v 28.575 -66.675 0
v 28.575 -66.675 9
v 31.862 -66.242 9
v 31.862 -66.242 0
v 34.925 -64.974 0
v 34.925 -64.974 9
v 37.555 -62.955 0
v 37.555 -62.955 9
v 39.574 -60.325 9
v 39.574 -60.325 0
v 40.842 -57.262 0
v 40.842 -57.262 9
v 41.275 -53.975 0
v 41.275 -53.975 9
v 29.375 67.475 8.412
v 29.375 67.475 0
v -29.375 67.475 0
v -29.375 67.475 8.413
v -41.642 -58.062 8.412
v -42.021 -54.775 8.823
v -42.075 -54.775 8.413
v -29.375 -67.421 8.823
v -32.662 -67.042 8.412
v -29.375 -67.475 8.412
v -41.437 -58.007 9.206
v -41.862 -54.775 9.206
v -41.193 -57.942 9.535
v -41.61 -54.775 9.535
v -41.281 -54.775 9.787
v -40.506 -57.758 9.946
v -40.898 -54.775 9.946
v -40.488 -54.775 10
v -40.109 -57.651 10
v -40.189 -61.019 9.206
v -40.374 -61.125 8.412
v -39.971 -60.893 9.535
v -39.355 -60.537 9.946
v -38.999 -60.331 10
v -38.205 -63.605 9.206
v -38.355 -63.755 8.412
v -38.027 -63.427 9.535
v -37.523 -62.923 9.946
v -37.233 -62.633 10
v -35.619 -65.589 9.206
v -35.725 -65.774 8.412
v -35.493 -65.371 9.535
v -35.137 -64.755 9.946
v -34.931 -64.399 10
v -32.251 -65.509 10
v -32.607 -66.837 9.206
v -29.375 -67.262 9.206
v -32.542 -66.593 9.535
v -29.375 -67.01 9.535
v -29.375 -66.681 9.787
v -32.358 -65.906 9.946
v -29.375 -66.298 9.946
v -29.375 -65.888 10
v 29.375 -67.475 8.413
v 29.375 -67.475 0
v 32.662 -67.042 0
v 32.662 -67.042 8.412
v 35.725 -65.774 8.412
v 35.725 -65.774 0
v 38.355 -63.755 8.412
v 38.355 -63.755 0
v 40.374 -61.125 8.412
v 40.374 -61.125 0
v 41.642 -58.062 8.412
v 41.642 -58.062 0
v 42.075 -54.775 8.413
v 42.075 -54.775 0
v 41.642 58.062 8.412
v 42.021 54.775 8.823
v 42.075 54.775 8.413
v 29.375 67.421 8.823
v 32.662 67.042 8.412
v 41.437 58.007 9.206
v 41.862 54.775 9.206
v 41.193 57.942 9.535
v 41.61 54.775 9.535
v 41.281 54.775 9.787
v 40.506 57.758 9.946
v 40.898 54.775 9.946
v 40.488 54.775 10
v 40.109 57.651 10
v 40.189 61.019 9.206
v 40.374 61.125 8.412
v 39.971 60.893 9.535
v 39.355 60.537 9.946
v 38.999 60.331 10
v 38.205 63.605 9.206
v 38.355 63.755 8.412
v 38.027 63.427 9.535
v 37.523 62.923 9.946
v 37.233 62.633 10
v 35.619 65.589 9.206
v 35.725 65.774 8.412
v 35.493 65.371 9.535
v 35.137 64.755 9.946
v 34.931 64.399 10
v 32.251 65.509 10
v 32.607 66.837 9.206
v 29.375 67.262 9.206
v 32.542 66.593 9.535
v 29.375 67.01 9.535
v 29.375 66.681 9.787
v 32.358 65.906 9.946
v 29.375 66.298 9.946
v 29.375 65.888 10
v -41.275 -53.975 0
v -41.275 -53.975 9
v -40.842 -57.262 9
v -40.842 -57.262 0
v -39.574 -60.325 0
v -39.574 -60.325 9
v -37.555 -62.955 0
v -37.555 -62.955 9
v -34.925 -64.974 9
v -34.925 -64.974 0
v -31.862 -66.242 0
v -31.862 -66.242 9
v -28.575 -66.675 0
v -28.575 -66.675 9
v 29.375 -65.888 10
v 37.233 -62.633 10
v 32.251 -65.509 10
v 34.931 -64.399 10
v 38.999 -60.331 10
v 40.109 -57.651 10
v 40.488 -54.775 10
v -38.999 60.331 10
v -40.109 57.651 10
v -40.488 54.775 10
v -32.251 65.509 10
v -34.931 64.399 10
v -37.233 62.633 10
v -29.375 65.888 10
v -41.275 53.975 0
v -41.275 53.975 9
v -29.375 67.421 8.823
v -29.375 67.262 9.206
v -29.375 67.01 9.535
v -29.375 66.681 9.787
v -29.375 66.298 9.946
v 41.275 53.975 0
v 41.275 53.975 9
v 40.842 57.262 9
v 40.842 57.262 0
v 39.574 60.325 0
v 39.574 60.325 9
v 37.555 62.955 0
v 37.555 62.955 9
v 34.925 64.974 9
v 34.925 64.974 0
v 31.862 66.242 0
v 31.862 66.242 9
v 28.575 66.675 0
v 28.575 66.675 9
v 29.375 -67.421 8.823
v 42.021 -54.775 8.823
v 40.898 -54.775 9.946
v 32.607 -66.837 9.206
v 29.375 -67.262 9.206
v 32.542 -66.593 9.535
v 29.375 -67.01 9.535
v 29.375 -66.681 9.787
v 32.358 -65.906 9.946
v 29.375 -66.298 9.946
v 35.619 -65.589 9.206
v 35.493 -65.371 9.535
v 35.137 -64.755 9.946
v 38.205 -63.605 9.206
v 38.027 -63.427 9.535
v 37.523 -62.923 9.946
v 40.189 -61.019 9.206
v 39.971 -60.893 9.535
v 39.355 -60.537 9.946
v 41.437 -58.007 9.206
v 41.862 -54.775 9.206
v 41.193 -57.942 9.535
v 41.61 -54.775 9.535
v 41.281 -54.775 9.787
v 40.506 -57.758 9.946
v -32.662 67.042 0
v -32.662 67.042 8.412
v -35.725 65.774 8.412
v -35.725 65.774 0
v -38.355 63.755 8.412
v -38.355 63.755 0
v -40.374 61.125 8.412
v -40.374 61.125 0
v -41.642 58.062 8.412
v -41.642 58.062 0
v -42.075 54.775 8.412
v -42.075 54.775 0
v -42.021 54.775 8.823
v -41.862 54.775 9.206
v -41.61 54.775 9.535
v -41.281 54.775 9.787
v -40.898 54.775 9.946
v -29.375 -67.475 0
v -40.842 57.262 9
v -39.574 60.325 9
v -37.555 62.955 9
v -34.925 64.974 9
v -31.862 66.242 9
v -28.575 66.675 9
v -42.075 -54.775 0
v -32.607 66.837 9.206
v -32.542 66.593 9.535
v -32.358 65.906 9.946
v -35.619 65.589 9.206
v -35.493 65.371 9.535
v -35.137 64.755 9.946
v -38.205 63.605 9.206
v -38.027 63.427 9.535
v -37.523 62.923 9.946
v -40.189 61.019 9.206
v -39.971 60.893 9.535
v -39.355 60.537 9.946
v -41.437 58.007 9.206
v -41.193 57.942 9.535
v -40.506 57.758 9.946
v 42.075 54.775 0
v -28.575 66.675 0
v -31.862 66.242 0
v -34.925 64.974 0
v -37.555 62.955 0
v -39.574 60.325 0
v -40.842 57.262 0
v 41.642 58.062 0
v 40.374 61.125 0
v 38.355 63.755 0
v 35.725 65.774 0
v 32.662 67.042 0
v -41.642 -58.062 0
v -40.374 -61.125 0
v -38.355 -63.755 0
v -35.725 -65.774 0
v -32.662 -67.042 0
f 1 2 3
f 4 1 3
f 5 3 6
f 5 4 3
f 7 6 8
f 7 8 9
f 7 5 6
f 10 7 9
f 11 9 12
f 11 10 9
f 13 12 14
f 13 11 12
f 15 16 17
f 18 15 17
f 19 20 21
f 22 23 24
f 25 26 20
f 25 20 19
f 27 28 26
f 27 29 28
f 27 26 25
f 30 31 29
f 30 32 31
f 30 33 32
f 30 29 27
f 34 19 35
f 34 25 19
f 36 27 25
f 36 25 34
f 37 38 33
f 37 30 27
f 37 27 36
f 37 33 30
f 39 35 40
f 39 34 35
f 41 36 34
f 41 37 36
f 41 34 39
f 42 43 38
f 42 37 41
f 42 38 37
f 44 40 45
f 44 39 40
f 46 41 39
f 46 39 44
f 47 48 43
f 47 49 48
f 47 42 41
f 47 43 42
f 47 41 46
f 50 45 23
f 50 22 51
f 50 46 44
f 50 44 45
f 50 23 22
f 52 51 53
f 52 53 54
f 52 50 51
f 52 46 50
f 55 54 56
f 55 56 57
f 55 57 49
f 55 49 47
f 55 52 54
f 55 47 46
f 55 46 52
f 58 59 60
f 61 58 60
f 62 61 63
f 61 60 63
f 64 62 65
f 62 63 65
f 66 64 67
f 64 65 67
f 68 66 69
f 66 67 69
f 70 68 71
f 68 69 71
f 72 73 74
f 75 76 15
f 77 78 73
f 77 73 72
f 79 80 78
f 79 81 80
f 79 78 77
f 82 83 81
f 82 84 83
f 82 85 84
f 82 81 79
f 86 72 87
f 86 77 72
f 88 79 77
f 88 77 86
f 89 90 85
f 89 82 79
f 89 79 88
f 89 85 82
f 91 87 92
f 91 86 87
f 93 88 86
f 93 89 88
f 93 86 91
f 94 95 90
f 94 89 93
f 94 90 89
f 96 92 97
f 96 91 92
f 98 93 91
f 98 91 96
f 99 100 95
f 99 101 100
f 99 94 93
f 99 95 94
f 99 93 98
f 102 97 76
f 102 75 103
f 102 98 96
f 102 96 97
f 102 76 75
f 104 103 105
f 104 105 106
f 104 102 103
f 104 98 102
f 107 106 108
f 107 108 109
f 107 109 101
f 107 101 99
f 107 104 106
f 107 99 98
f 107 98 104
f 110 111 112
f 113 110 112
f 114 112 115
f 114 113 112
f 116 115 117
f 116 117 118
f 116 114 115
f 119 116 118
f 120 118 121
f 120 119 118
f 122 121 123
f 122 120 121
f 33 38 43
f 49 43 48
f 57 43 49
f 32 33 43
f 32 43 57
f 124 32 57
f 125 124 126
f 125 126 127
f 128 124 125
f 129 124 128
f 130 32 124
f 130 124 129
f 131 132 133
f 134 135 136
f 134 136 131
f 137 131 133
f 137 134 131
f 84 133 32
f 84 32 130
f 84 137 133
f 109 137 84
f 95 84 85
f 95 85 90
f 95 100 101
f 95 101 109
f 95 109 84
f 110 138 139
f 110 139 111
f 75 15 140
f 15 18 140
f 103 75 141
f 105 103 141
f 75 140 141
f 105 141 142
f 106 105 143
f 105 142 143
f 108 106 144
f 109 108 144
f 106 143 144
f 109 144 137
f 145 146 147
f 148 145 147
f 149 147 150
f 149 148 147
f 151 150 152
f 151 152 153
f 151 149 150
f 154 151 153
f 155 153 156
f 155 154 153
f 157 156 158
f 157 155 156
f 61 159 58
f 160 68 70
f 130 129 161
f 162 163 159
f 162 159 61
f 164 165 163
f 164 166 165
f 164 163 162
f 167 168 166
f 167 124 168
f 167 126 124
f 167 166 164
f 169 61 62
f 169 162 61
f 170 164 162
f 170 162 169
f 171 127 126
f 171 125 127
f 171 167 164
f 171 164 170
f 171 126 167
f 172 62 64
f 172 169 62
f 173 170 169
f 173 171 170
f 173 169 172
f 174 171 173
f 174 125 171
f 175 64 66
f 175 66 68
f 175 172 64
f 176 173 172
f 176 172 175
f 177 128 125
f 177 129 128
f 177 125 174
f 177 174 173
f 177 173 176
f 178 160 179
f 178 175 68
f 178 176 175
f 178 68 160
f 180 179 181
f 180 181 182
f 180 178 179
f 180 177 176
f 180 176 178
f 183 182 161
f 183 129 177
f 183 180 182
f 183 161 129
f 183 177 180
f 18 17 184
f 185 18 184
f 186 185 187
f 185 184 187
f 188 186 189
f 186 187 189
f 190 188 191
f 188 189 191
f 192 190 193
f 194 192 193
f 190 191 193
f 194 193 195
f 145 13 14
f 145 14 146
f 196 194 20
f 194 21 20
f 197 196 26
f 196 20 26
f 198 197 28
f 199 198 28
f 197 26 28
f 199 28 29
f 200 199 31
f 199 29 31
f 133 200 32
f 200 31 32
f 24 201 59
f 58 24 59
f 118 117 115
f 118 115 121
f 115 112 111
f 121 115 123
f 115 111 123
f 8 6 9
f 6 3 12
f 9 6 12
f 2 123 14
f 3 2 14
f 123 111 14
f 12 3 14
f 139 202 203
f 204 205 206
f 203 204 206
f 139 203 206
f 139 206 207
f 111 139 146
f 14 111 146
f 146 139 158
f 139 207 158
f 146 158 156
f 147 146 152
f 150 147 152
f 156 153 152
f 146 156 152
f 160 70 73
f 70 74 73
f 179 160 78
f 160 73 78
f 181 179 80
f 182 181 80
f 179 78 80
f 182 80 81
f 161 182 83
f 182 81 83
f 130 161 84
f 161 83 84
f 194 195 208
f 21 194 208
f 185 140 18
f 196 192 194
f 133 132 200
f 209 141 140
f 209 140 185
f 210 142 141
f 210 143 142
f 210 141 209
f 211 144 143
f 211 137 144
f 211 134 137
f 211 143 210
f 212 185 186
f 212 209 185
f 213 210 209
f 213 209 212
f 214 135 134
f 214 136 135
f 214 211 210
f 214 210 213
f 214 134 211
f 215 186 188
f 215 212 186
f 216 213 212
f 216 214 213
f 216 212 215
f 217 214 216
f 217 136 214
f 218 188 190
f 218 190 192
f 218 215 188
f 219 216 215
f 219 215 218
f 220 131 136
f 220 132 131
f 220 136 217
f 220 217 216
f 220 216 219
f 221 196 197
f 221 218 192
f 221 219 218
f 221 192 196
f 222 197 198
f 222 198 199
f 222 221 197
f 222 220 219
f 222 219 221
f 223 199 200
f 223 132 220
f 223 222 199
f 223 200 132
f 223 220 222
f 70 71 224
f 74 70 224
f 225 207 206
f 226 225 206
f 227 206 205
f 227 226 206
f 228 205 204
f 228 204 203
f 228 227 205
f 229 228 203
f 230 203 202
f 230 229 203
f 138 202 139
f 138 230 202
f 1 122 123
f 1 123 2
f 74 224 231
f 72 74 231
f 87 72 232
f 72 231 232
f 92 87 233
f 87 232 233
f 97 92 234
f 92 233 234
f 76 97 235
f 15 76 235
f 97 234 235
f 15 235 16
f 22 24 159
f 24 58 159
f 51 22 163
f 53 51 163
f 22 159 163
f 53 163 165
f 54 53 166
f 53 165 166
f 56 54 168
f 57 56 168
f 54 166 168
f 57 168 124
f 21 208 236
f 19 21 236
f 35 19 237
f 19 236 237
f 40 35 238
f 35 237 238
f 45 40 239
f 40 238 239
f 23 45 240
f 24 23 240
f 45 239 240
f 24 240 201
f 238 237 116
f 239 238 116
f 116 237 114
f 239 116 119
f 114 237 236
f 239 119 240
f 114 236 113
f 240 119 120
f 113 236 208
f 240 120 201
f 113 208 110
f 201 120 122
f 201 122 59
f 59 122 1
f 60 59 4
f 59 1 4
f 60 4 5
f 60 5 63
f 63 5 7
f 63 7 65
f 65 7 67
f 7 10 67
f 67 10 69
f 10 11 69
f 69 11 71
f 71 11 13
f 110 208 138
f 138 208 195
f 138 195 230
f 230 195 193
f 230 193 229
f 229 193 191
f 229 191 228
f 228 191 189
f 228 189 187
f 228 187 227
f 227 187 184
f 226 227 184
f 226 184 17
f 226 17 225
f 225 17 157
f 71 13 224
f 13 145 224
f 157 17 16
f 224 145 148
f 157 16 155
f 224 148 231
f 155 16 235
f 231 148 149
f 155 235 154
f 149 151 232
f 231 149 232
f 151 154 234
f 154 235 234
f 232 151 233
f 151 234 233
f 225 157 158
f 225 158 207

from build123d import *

# Parameters (mm, degrees)
F1_DEPTH = 10
F2_R     = 1.5875
F4_DEPTH = 9


with BuildPart() as f1:
    # F0 (on Top) → F1 (new body)
    with BuildSketch(Plane.XY):
        with BuildLine():
            ThreePointArc((42.0751, 54.7751), (38.355356, 63.755356), (29.3751, 67.4751))
            Line((29.3751, 67.4751), (-29.3751, 67.4751))
            ThreePointArc((-29.3751, 67.4751), (-38.355356, 63.755356), (-42.0751, 54.7751))
            Line((-42.0751, 54.7751), (-42.0751, -54.7751))
            ThreePointArc((-42.0751, -54.7751), (-38.355356, -63.755356), (-29.3751, -67.4751))
            Line((-29.3751, -67.4751), (29.3751, -67.4751))
            ThreePointArc((29.3751, -67.4751), (38.355356, -63.755356), (42.0751, -54.7751))
            Line((42.0751, -54.7751), (42.0751, 54.7751))
        make_face()
    extrude(amount=F1_DEPTH)

    # F2
    f2_edges = [f1.edges().sort_by_distance(p)[0] for p in [
        (42.0751, 0, 10),
        (38.355356, -63.755356, 10),
        (0, -67.4751, 10),
        (-38.355356, -63.755356, 10),
        (-42.0751, 0, 10),
        (-38.355356, 63.755356, 10),
        (0, 67.4751, 10),
        (38.355356, 63.755356, 10),
    ]]
    fillet(f2_edges, radius=F2_R)

    # F3 (on Top) → F4 (cut)
    with BuildSketch(Plane.XY):
        with BuildLine():
            Line((-28.575, -66.675), (28.575, -66.675))
            ThreePointArc((28.575, -66.675), (37.555256, -62.955256), (41.275, -53.975))
            Line((41.275, -53.975), (41.275, 53.975))
            ThreePointArc((41.275, 53.975), (37.555256, 62.955256), (28.575, 66.675))
            Line((28.575, 66.675), (-28.575, 66.675))
            ThreePointArc((-28.575, 66.675), (-37.555256, 62.955256), (-41.275, 53.975))
            Line((-41.275, 53.975), (-41.275, -53.975))
            ThreePointArc((-41.275, -53.975), (-37.555256, -62.955256), (-28.575, -66.675))
        make_face()
    extrude(amount=F4_DEPTH, mode=Mode.SUBTRACT)


solid = f1.part
